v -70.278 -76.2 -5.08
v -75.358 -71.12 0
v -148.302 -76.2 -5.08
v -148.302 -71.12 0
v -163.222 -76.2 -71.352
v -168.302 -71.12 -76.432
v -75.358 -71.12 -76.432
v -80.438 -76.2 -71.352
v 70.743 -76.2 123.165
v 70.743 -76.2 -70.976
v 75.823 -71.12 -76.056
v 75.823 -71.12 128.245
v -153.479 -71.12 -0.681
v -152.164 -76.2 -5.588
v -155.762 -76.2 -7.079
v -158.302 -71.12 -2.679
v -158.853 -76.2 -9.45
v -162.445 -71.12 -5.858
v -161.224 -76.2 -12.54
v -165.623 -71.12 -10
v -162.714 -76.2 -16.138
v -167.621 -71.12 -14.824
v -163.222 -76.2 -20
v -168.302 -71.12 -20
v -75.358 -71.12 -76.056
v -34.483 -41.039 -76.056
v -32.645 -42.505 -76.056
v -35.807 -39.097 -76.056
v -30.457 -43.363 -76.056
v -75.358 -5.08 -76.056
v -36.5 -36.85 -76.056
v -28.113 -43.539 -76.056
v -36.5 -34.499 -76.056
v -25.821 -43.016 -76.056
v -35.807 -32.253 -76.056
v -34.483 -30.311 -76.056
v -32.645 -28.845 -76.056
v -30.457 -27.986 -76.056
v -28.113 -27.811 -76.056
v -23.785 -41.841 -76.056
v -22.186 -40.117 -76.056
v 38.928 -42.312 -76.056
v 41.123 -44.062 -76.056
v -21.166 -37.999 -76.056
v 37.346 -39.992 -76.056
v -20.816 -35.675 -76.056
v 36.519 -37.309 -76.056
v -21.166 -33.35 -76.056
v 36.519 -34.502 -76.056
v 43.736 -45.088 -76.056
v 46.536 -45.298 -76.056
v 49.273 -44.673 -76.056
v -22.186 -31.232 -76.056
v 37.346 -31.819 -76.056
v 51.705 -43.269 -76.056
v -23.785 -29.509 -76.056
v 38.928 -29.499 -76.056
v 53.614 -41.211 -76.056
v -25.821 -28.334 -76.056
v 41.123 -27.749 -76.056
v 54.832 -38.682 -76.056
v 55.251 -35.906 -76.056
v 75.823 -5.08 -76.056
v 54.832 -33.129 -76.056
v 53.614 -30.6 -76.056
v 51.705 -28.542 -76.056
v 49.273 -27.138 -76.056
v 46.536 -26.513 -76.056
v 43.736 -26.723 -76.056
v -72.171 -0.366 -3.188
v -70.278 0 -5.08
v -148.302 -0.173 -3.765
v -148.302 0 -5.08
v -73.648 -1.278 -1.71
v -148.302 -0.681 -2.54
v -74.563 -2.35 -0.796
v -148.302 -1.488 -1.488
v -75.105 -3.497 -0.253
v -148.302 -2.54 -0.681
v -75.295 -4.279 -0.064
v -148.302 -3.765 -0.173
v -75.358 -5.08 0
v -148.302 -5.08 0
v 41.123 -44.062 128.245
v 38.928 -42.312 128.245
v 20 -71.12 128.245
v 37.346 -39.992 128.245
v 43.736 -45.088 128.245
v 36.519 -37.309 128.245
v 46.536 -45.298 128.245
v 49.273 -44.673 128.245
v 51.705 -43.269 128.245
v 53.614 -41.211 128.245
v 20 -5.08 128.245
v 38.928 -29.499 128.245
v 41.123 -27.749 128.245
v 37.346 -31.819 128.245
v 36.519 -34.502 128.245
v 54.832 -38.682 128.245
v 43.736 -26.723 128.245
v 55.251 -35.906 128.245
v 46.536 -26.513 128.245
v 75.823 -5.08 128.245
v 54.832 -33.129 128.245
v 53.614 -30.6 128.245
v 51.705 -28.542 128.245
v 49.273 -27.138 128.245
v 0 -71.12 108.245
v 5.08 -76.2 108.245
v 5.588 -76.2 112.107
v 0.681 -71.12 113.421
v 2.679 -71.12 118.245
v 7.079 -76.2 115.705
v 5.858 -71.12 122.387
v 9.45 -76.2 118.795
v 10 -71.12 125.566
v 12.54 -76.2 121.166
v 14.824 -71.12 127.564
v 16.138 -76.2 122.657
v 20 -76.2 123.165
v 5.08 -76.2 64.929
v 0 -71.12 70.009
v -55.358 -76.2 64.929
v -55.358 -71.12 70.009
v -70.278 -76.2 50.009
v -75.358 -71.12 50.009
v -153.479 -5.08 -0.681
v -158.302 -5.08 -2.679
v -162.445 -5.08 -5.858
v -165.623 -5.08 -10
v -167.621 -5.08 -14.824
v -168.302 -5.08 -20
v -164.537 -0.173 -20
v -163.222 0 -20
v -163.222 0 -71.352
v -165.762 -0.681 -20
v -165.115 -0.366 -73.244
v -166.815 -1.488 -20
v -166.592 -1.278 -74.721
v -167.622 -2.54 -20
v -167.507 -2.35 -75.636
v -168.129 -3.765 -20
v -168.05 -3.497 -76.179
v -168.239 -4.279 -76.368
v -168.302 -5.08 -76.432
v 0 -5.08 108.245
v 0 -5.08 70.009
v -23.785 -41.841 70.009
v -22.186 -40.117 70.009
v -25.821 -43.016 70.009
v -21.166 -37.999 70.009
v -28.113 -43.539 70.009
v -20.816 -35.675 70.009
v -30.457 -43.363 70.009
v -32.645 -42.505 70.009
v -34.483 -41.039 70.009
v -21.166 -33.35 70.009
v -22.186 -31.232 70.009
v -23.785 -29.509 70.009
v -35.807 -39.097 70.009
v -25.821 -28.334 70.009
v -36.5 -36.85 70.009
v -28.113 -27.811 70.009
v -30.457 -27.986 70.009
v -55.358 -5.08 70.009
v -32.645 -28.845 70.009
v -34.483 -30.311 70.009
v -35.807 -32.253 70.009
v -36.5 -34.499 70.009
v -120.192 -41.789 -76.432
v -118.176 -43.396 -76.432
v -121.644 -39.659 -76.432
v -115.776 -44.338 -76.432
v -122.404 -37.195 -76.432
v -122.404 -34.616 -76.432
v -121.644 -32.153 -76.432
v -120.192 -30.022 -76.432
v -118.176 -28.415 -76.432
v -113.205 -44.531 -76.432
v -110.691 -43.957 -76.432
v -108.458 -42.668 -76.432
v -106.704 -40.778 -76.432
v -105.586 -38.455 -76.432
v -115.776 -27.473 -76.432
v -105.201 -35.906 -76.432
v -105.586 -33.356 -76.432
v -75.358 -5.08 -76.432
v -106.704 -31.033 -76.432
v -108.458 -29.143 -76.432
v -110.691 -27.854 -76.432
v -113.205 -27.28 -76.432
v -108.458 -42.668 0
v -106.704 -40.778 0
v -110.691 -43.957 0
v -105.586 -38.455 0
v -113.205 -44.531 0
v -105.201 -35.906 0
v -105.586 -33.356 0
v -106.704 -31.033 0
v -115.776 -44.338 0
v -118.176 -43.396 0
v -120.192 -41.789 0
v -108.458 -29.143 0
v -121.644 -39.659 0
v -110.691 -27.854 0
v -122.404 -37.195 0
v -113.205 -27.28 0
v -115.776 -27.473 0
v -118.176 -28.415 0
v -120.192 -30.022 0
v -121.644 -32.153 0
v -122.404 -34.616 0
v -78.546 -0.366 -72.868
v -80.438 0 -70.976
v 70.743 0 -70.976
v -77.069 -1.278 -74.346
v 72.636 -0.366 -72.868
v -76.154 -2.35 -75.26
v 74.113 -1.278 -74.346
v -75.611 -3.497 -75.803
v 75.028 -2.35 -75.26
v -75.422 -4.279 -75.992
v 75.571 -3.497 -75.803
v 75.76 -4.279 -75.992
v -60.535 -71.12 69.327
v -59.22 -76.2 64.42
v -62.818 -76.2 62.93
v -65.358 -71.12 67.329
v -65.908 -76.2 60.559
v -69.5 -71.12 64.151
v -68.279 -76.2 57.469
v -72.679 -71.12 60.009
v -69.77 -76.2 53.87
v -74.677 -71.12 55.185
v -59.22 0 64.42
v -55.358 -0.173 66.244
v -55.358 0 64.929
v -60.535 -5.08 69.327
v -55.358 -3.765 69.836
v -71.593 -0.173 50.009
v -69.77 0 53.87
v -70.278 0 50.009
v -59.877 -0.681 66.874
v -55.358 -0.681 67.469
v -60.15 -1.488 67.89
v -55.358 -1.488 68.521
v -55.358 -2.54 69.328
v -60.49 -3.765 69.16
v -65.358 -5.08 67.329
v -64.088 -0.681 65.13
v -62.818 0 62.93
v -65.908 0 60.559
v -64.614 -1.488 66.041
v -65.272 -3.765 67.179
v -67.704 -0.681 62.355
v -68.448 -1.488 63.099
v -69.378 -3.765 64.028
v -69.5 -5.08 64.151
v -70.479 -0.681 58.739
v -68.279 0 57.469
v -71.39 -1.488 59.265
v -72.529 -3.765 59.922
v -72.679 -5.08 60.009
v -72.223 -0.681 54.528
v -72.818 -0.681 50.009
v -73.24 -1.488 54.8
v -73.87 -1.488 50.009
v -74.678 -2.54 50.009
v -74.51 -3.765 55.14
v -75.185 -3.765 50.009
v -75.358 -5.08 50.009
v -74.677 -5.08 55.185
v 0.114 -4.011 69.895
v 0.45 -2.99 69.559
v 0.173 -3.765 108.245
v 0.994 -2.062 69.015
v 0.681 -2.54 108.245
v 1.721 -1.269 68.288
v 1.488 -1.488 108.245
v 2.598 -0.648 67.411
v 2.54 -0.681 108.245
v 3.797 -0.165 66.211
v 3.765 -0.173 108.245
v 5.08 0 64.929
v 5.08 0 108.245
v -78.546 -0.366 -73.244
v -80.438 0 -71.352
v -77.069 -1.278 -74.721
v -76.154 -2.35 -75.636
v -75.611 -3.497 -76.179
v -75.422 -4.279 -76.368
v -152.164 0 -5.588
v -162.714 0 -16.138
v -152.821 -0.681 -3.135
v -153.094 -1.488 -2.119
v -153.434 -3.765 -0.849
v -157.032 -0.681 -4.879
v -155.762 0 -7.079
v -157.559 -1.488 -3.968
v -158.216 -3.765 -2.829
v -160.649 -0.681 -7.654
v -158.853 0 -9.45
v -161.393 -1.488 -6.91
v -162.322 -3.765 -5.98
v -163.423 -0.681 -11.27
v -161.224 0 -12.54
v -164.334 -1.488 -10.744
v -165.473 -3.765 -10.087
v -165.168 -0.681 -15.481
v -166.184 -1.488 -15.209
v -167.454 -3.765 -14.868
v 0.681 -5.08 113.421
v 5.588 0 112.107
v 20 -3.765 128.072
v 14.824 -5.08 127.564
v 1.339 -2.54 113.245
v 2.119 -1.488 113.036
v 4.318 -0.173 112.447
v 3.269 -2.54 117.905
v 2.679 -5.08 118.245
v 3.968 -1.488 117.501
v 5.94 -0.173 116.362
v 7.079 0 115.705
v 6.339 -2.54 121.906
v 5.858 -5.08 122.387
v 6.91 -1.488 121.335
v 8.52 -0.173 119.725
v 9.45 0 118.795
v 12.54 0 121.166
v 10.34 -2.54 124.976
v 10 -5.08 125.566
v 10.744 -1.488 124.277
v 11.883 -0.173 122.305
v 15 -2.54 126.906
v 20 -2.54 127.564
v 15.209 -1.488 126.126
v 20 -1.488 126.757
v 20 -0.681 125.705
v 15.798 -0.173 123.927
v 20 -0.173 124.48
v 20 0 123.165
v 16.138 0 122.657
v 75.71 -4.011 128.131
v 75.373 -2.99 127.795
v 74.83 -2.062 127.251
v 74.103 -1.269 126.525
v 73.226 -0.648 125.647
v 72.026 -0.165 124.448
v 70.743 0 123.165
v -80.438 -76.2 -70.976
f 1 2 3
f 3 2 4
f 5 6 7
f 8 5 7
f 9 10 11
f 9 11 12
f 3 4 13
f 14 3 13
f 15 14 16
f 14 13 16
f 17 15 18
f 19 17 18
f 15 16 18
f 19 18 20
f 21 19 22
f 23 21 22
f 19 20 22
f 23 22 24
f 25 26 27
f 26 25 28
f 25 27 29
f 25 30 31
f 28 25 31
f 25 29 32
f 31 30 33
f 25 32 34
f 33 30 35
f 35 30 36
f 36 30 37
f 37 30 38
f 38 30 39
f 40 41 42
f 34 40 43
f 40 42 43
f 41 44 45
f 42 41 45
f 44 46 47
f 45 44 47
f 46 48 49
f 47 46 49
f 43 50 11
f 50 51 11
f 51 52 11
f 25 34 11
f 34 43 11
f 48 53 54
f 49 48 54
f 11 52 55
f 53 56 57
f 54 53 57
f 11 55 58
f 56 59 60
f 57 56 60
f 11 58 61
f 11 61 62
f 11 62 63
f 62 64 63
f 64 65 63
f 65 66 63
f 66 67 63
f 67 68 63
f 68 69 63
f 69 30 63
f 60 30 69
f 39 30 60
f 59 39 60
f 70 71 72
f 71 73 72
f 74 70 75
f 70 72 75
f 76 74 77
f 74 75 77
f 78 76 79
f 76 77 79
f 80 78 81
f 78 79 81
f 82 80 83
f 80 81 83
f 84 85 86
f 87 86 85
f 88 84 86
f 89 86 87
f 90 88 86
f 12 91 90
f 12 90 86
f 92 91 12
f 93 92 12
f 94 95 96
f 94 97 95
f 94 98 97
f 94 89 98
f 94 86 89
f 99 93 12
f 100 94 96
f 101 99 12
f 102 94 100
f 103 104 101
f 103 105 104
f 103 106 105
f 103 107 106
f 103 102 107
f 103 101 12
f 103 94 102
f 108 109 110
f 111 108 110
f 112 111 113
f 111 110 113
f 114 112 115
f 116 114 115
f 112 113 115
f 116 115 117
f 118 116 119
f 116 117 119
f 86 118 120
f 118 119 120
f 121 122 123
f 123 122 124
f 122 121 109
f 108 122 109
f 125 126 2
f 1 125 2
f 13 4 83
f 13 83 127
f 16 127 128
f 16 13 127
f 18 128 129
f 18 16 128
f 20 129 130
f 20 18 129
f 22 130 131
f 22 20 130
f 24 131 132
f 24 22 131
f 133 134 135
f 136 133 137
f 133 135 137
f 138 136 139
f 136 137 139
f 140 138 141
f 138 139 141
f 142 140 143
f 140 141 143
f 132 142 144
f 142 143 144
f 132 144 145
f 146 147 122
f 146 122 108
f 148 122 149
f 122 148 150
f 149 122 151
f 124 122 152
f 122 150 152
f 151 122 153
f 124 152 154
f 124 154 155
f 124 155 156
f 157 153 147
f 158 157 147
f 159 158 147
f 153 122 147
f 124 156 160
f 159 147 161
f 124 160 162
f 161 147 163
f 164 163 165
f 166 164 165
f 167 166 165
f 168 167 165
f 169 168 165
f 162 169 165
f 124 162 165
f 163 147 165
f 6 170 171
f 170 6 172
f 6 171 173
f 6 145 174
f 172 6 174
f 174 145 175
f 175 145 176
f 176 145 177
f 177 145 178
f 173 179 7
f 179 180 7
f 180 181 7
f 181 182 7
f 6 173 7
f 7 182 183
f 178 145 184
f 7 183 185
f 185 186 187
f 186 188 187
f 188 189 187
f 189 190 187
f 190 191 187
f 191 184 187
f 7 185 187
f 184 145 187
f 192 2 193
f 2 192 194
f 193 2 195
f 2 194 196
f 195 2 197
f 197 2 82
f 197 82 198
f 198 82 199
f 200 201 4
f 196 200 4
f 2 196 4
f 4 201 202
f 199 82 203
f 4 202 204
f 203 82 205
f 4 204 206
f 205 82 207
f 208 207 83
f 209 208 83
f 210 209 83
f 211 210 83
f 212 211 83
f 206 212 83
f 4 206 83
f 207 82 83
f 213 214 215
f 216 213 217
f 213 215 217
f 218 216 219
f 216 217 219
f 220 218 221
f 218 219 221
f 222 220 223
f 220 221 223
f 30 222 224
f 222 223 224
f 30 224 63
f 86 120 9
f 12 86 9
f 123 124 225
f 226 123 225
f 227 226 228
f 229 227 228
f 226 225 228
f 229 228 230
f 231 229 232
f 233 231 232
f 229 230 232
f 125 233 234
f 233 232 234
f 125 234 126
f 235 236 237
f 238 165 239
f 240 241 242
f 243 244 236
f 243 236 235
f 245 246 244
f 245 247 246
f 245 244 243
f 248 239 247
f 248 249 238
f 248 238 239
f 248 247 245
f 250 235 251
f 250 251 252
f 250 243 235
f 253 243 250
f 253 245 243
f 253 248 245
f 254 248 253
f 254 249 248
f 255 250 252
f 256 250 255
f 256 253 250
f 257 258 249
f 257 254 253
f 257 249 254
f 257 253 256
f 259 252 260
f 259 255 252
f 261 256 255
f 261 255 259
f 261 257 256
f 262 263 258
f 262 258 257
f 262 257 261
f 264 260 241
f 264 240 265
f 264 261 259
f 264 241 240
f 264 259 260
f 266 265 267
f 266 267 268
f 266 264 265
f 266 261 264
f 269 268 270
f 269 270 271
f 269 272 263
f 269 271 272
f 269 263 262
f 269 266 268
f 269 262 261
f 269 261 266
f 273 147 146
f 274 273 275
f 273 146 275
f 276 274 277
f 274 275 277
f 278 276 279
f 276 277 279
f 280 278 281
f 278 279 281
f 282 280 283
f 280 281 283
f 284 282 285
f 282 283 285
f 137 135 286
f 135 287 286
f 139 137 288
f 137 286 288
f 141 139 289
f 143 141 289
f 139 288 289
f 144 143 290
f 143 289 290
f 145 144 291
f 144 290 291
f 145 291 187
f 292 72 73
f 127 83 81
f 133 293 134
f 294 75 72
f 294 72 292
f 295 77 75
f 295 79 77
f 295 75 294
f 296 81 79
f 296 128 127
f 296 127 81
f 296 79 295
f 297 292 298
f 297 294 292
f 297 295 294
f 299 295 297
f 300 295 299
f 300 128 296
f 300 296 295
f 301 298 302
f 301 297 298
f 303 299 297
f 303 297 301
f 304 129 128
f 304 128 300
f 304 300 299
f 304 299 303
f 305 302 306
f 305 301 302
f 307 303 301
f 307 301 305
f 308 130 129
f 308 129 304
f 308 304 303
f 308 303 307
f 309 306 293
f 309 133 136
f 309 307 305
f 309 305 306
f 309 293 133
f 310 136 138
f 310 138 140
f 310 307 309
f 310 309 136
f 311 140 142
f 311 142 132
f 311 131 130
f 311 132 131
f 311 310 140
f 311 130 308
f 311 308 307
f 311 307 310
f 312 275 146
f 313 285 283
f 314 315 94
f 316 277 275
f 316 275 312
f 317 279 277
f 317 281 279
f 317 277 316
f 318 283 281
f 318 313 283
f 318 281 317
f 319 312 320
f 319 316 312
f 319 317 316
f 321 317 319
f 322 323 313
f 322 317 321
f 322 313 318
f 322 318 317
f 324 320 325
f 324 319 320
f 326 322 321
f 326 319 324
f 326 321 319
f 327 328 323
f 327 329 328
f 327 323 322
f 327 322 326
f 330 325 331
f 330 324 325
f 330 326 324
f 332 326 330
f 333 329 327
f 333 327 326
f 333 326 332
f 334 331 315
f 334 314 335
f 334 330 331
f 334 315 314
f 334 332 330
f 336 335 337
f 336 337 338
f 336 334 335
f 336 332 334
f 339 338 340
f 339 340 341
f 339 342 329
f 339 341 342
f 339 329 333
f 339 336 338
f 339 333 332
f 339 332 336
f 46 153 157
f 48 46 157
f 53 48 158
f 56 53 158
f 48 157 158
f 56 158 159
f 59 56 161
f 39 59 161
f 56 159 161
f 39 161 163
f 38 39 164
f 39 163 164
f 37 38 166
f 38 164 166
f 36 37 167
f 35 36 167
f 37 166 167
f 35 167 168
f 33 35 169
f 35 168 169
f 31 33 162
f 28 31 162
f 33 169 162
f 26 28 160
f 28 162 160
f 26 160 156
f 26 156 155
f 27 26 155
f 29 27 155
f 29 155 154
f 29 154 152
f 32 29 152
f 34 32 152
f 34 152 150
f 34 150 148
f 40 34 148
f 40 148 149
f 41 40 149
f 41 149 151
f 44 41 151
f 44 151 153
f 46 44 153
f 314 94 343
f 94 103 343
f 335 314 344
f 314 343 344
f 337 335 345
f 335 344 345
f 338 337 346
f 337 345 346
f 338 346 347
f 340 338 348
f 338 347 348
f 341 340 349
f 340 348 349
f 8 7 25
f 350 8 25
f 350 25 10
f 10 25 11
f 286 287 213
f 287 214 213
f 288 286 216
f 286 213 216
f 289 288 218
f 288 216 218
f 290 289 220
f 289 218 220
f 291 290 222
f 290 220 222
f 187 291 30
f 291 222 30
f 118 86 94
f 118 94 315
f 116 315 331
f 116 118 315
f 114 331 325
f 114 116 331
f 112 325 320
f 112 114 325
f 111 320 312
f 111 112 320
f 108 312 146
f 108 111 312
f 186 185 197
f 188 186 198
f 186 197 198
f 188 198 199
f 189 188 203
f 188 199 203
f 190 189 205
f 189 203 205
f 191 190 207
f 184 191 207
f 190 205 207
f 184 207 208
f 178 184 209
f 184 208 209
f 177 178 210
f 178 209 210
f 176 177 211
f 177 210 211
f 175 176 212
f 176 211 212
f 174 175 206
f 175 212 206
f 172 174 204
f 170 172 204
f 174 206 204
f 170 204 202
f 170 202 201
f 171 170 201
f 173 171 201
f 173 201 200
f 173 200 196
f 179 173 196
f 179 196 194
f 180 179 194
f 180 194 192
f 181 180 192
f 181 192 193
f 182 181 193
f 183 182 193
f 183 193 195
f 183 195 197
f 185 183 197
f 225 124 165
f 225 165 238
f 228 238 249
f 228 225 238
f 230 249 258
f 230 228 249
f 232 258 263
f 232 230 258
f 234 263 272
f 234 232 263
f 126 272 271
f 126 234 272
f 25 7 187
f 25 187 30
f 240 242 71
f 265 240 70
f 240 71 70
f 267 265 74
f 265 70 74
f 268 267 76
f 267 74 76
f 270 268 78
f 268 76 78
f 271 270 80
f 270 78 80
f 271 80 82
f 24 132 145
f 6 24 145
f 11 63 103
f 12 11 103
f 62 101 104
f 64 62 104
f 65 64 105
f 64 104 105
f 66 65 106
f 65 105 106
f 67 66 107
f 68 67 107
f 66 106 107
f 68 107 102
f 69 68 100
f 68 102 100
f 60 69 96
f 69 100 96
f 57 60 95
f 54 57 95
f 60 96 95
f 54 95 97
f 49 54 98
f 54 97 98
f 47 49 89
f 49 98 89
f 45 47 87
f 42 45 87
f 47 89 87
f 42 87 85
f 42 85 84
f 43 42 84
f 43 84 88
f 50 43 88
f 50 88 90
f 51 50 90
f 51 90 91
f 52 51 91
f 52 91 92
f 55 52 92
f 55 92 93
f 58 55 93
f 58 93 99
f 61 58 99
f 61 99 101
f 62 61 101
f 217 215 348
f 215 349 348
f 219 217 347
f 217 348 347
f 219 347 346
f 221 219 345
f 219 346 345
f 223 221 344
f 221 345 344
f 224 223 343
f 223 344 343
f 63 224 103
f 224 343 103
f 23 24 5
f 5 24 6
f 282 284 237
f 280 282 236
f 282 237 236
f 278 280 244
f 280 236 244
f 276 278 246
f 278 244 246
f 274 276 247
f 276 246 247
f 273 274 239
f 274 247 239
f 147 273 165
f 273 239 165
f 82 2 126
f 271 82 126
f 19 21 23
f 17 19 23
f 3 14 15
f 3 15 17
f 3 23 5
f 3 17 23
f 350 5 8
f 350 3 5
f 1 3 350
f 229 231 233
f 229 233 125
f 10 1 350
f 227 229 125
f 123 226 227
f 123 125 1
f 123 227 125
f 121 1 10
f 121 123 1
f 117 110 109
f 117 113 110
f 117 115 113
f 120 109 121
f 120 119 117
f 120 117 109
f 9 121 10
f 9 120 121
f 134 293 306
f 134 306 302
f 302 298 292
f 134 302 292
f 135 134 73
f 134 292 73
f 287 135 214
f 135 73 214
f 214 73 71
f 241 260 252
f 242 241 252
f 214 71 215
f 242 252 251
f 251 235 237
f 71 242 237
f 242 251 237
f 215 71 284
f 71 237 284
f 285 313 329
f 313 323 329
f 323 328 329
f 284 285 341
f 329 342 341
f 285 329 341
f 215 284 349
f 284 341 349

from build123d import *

# Parameters (mm, degrees)
F0_W     = 75.3582566977
F0_H     = 34.1903194785
F0_W_2   = 75.8234262466
F0_H_2   = 70.0087472796
F0_H_3   = 58.2362934947
F1_DEPTH = 76.2
F2_DEPTH = 30
F3_R     = 20
F4_SIZE  = 5.08
F5_R     = 5.08
F6_R     = 8.6494969127
F6_R_2   = 7.8863164194
F6_R_3   = 9.4186807379
F7_DEPTH = 204.6777398715


with BuildPart() as f1:
    # F0 (on Front) → F1 (new body)
    with BuildSketch(Plane.XZ):
        Polygon((-75.3582566977, -34.1903194785), (-75.3582566977, -76.0560184717), (75.8234262466, -76.0560184717), (75.8234262466, -34.1903194785), (0, -34.1903194785), align=None)
        Polygon((-75.3582566977, -76.4316990972), (-75.3582566977, -76.0560184717), (-75.3582566977, -34.1903194785), (-75.3582566977, 0), (-168.3024764061, 0), (-168.3024764061, -76.4316990972), align=None)
        with Locations((-37.6791283488, -17.0951597393)):
            Rectangle(F0_W, F0_H)
        with Locations((37.9117131233, -17.0951597393)):
            Rectangle(F0_W_2, F0_H)
        with Locations((-37.6791283488, 35.0043736398)):
            Rectangle(F0_W, F0_H_2)
        with Locations((37.9117131233, 35.0043736398)):
            Rectangle(F0_W_2, F0_H_2)
        with Locations((37.9117131233, 99.126894027)):
            Rectangle(F0_W_2, F0_H_3)
    extrude(amount=F1_DEPTH)

    # F0 (on Front) → F2 (join)
    with BuildSketch(Plane.XZ):
        Polygon((-75.3582566977, -34.1903194785), (-75.3582566977, -76.0560184717), (75.8234262466, -76.0560184717), (75.8234262466, -34.1903194785), (0, -34.1903194785), align=None)
        Polygon((-75.3582566977, -76.4316990972), (-75.3582566977, -76.0560184717), (-75.3582566977, -34.1903194785), (-75.3582566977, 0), (-168.3024764061, 0), (-168.3024764061, -76.4316990972), align=None)
        with Locations((-37.6791283488, -17.0951597393)):
            Rectangle(F0_W, F0_H)
        with Locations((37.9117131233, -17.0951597393)):
            Rectangle(F0_W_2, F0_H)
        with Locations((-37.6791283488, 35.0043736398)):
            Rectangle(F0_W, F0_H_2)
        with Locations((37.9117131233, 35.0043736398)):
            Rectangle(F0_W_2, F0_H_2)
        with Locations((37.9117131233, 99.126894027)):
            Rectangle(F0_W_2, F0_H_3)
    extrude(amount=F2_DEPTH)

    # F3
    f3_edges = [f1.edges().sort_by_distance(p)[0] for p in [
        (0, -38.1, 128.245041),
        (-75.358257, -38.1, 70.008747),
        (-168.302476, -38.1, 0),
    ]]
    fillet(f3_edges, radius=F3_R)

    # F4
    f4_edges = [f1.edges().sort_by_distance(p)[0] for p in [
        (47.911713, -76.2, 128.245041),
        (5.857864, -76.2, 122.387176),
        (75.823426, -76.2, 26.094511),
        (0, -76.2, 89.126894),
        (0.232585, -76.2, -76.056018),
        (-27.679128, -76.2, 70.008747),
        (-75.358257, -76.2, -76.243859),
        (-69.500392, -76.2, 64.150883),
        (-121.830367, -76.2, -76.431699),
        (-75.358257, -76.2, 25.004374),
        (-168.302476, -76.2, -48.21585),
        (-111.830367, -76.2, 0),
        (-162.444612, -76.2, -5.857864),
    ]]
    chamfer(f4_edges, length=F4_SIZE)

    # F5
    f5_edges = [f1.edges().sort_by_distance(p)[0] for p in [
        (47.911713, 0, 128.245041),
        (5.857864, 0, 122.387176),
        (75.823426, 0, 26.094511),
        (0, 0, 89.126894),
        (0.232585, 0, -76.056018),
        (-27.679128, 0, 70.008747),
        (-75.358257, 0, -76.243859),
        (-69.500392, 0, 64.150883),
        (-121.830367, 0, -76.431699),
        (-75.358257, 0, 25.004374),
        (-168.302476, 0, -48.21585),
        (-111.830367, 0, 0),
        (-162.444612, 0, -5.857864),
    ]]
    fillet(f5_edges, radius=F5_R)

    # F6 (on face) → F7 (cut, through all)
    with BuildSketch(Plane.XY.offset(128.2450407743)):
        with Locations((-113.8509809971, -35.9056405723)):
            Circle(F6_R)
        with Locations((-28.7020821124, -35.6748849154)):
            Circle(F6_R_2)
        with Locations((45.8320491016, -35.9056405723)):
            Circle(F6_R_3)
    extrude(amount=-F7_DEPTH, mode=Mode.SUBTRACT)


solid = f1.part
